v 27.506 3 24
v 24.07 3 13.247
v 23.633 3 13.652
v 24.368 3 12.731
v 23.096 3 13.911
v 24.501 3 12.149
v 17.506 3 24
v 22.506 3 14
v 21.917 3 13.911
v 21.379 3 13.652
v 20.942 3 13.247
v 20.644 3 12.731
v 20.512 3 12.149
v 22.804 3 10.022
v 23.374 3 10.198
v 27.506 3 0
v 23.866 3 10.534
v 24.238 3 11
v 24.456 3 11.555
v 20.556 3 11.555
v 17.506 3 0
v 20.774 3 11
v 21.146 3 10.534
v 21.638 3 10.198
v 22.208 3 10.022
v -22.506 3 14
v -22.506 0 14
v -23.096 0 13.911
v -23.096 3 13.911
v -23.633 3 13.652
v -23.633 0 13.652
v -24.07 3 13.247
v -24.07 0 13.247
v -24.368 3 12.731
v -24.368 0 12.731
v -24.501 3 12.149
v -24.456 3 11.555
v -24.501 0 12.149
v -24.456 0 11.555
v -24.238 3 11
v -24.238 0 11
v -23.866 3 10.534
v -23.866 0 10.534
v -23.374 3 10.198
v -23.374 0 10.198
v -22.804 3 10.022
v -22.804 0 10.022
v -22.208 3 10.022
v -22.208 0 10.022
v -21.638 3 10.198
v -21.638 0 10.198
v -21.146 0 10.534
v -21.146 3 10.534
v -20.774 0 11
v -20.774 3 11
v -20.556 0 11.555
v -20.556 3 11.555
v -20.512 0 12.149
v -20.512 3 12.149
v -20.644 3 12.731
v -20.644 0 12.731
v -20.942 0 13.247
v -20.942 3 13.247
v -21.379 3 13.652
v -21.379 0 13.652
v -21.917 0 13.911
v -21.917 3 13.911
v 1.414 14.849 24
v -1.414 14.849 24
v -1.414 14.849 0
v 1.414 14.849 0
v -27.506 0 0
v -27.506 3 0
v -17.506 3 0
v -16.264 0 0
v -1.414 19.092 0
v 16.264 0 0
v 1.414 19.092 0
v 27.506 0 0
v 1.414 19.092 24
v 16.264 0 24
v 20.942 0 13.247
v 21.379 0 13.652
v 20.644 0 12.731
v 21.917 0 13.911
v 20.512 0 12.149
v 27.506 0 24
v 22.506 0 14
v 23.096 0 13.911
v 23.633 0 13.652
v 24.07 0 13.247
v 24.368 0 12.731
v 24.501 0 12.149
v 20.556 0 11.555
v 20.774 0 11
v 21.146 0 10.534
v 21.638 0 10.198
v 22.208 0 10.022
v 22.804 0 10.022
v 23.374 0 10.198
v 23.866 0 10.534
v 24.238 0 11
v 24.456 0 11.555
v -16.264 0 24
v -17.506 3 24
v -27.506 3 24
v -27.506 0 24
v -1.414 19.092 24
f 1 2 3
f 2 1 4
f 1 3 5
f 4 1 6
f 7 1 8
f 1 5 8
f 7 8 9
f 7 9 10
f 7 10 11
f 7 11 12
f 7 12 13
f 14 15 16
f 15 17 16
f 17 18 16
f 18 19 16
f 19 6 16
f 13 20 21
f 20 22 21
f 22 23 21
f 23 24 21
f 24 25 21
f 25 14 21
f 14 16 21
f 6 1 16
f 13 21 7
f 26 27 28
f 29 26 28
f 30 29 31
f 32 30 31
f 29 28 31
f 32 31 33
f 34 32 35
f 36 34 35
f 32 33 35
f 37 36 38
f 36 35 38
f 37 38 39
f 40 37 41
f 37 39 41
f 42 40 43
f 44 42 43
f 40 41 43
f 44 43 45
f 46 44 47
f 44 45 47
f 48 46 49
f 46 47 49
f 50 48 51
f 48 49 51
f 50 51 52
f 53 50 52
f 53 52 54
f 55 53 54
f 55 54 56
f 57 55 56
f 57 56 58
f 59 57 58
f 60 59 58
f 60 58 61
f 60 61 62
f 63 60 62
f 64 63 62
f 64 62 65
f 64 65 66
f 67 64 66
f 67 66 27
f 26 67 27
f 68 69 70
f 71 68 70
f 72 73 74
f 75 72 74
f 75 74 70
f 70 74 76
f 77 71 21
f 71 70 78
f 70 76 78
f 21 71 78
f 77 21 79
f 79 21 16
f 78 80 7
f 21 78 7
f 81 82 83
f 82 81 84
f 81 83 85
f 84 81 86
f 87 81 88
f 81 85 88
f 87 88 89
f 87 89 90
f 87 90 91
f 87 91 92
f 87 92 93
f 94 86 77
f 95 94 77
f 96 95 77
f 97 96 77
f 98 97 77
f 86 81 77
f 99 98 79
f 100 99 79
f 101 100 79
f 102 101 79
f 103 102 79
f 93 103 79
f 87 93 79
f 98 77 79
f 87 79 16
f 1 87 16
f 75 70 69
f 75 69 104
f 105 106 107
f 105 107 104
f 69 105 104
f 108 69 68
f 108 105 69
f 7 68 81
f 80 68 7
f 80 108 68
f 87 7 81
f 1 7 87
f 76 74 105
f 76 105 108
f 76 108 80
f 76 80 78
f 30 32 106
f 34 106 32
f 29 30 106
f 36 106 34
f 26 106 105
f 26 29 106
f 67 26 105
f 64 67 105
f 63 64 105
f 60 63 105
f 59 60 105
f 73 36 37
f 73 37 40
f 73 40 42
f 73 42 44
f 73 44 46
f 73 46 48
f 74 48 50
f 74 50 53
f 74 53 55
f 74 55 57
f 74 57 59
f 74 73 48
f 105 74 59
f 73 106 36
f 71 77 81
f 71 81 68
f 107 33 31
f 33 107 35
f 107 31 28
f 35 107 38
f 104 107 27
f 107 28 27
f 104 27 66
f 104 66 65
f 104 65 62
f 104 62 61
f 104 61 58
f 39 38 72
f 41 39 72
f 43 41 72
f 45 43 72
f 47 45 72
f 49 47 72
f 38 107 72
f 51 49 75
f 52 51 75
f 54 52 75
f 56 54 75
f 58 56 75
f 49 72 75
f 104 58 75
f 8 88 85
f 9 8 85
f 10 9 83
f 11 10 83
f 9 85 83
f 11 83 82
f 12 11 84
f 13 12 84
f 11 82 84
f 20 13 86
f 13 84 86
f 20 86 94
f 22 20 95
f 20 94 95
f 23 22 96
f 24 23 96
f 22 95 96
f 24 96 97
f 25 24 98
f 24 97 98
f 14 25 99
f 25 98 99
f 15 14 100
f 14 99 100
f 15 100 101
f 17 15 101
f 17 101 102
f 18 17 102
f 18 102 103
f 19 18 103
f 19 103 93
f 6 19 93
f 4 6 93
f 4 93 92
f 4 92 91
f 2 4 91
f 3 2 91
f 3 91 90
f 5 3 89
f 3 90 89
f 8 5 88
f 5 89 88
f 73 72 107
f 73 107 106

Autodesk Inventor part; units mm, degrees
ref_plane "YZ Plane" through (0, 0, 0) normal (1, 0, 0) x (0, 1, 0)
ref_plane "XZ Plane" through (0, 0, 0) normal (0, 1, 0) x (-1, 0, 0)
ref_plane "XY Plane" through (0, 0, 0) normal (0, 0, 1) x (1, 0, 0)
sketch "Sketch1" plane through (0, 0, 0) normal (0, 0, 1) x (1, 0, 0)
  line L0 (0, -28.7085) -> (0, 28.7085) projected
  line L1 (0, 28.7085) -> (0, -28.7085) projected
  line L2 (-38.5085, 0) -> (38.5085, 0) projected
  line L3 (0, -16.2635) -> (16.2635, 0)
  line L4 (16.2635, 0) -> (0, 16.2635)
  line L5 (0, 16.2635) -> (-16.2635, 0)
  line L6 (-16.2635, 0) -> (0, -16.2635)
  line L7 (0, -16.2635) -> (0, 16.2635) construction
  line L8 (16.2635, 0) -> (-16.2635, 0) construction
  line L9 (0, -16.2635) -> (23, -16.2635) construction
  line L10 (0, -20.5061) -> (-17.5061, -3)
  line L11 (-17.5061, -3) -> (-27.5061, -3)
  line L12 (-27.5061, -3) -> (-27.5061, 3)
  line L13 (-27.5061, 3) -> (-17.5061, 3)
  line L14 (-17.5061, 3) -> (0, 20.5061)
  line L15 (0, 20.5061) -> (17.5061, 3)
  line L16 (17.5061, -3) -> (0, -20.5061)
  line L17 (-38.5085, 0) -> (38.5085, 0) projected
  line L18 (-27.5061, 0) -> (-16.2635, 0)
  line L19 (16.2635, 0) -> (23.5061, 0)
  line L20 (17.5061, -3) -> (27.5061, -3)
  line L21 (27.5061, -3) -> (27.5061, 3)
  line L22 (27.5061, 3) -> (17.5061, 3)
  line L23 (16.2635, 0) -> (27.5061, 0)
  point P0 (0, 0)
  point P1 (-16.2635, 0)
  point P2 (16.2635, 0)
  point P3 (27.5061, 0)
  dimension "d34" = 23
  dimension "d35" = 45
  dimension "d36" = 23
  dimension "d37" = 3
  dimension "d38" = 3
  dimension "d39" = 45
  dimension "d41" = 6
  dimension "d49" = 10
  dimension "d50" = 6
  dimension "d51" = 3
  dimension "d52" = 10
extrude "Extrusion2" add sketch "Sketch1" along normal blind 24 contours L4 L0 L15 L22 L21 L2 | L2 L12 L13 L14 L0 L5
sketch "Sketch3" plane through (-27.5061, 3, 0) normal (0, 1, 0) x (1, 0, 0)
  line L0 (66.0146, 0) -> (-11.0024, 0) projected
  line L1 (0, 0) -> (0, -24) projected
  line L2 (55.0122, 0) -> (55.0122, -24) projected
  point P0 (27.5061, 0)
  point P1 (5, -12)
  point P2 (50.0122, -12)
  dimension "d55" = 12
  dimension "d56" = 12
  dimension "d57" = 5
  dimension "d58" = 5
hole "Hole1" at (-22.5061, 3, 12) at (22.5061, 3, 12) direction (0, -1, 0) diameter 4 end through all
chamfer "Chamfer1" distance 2 angle 45 2 edges at (0, 20.5061, 12) (0, 16.2635, 12)
properties part number "Fan_top_3DPrint"
